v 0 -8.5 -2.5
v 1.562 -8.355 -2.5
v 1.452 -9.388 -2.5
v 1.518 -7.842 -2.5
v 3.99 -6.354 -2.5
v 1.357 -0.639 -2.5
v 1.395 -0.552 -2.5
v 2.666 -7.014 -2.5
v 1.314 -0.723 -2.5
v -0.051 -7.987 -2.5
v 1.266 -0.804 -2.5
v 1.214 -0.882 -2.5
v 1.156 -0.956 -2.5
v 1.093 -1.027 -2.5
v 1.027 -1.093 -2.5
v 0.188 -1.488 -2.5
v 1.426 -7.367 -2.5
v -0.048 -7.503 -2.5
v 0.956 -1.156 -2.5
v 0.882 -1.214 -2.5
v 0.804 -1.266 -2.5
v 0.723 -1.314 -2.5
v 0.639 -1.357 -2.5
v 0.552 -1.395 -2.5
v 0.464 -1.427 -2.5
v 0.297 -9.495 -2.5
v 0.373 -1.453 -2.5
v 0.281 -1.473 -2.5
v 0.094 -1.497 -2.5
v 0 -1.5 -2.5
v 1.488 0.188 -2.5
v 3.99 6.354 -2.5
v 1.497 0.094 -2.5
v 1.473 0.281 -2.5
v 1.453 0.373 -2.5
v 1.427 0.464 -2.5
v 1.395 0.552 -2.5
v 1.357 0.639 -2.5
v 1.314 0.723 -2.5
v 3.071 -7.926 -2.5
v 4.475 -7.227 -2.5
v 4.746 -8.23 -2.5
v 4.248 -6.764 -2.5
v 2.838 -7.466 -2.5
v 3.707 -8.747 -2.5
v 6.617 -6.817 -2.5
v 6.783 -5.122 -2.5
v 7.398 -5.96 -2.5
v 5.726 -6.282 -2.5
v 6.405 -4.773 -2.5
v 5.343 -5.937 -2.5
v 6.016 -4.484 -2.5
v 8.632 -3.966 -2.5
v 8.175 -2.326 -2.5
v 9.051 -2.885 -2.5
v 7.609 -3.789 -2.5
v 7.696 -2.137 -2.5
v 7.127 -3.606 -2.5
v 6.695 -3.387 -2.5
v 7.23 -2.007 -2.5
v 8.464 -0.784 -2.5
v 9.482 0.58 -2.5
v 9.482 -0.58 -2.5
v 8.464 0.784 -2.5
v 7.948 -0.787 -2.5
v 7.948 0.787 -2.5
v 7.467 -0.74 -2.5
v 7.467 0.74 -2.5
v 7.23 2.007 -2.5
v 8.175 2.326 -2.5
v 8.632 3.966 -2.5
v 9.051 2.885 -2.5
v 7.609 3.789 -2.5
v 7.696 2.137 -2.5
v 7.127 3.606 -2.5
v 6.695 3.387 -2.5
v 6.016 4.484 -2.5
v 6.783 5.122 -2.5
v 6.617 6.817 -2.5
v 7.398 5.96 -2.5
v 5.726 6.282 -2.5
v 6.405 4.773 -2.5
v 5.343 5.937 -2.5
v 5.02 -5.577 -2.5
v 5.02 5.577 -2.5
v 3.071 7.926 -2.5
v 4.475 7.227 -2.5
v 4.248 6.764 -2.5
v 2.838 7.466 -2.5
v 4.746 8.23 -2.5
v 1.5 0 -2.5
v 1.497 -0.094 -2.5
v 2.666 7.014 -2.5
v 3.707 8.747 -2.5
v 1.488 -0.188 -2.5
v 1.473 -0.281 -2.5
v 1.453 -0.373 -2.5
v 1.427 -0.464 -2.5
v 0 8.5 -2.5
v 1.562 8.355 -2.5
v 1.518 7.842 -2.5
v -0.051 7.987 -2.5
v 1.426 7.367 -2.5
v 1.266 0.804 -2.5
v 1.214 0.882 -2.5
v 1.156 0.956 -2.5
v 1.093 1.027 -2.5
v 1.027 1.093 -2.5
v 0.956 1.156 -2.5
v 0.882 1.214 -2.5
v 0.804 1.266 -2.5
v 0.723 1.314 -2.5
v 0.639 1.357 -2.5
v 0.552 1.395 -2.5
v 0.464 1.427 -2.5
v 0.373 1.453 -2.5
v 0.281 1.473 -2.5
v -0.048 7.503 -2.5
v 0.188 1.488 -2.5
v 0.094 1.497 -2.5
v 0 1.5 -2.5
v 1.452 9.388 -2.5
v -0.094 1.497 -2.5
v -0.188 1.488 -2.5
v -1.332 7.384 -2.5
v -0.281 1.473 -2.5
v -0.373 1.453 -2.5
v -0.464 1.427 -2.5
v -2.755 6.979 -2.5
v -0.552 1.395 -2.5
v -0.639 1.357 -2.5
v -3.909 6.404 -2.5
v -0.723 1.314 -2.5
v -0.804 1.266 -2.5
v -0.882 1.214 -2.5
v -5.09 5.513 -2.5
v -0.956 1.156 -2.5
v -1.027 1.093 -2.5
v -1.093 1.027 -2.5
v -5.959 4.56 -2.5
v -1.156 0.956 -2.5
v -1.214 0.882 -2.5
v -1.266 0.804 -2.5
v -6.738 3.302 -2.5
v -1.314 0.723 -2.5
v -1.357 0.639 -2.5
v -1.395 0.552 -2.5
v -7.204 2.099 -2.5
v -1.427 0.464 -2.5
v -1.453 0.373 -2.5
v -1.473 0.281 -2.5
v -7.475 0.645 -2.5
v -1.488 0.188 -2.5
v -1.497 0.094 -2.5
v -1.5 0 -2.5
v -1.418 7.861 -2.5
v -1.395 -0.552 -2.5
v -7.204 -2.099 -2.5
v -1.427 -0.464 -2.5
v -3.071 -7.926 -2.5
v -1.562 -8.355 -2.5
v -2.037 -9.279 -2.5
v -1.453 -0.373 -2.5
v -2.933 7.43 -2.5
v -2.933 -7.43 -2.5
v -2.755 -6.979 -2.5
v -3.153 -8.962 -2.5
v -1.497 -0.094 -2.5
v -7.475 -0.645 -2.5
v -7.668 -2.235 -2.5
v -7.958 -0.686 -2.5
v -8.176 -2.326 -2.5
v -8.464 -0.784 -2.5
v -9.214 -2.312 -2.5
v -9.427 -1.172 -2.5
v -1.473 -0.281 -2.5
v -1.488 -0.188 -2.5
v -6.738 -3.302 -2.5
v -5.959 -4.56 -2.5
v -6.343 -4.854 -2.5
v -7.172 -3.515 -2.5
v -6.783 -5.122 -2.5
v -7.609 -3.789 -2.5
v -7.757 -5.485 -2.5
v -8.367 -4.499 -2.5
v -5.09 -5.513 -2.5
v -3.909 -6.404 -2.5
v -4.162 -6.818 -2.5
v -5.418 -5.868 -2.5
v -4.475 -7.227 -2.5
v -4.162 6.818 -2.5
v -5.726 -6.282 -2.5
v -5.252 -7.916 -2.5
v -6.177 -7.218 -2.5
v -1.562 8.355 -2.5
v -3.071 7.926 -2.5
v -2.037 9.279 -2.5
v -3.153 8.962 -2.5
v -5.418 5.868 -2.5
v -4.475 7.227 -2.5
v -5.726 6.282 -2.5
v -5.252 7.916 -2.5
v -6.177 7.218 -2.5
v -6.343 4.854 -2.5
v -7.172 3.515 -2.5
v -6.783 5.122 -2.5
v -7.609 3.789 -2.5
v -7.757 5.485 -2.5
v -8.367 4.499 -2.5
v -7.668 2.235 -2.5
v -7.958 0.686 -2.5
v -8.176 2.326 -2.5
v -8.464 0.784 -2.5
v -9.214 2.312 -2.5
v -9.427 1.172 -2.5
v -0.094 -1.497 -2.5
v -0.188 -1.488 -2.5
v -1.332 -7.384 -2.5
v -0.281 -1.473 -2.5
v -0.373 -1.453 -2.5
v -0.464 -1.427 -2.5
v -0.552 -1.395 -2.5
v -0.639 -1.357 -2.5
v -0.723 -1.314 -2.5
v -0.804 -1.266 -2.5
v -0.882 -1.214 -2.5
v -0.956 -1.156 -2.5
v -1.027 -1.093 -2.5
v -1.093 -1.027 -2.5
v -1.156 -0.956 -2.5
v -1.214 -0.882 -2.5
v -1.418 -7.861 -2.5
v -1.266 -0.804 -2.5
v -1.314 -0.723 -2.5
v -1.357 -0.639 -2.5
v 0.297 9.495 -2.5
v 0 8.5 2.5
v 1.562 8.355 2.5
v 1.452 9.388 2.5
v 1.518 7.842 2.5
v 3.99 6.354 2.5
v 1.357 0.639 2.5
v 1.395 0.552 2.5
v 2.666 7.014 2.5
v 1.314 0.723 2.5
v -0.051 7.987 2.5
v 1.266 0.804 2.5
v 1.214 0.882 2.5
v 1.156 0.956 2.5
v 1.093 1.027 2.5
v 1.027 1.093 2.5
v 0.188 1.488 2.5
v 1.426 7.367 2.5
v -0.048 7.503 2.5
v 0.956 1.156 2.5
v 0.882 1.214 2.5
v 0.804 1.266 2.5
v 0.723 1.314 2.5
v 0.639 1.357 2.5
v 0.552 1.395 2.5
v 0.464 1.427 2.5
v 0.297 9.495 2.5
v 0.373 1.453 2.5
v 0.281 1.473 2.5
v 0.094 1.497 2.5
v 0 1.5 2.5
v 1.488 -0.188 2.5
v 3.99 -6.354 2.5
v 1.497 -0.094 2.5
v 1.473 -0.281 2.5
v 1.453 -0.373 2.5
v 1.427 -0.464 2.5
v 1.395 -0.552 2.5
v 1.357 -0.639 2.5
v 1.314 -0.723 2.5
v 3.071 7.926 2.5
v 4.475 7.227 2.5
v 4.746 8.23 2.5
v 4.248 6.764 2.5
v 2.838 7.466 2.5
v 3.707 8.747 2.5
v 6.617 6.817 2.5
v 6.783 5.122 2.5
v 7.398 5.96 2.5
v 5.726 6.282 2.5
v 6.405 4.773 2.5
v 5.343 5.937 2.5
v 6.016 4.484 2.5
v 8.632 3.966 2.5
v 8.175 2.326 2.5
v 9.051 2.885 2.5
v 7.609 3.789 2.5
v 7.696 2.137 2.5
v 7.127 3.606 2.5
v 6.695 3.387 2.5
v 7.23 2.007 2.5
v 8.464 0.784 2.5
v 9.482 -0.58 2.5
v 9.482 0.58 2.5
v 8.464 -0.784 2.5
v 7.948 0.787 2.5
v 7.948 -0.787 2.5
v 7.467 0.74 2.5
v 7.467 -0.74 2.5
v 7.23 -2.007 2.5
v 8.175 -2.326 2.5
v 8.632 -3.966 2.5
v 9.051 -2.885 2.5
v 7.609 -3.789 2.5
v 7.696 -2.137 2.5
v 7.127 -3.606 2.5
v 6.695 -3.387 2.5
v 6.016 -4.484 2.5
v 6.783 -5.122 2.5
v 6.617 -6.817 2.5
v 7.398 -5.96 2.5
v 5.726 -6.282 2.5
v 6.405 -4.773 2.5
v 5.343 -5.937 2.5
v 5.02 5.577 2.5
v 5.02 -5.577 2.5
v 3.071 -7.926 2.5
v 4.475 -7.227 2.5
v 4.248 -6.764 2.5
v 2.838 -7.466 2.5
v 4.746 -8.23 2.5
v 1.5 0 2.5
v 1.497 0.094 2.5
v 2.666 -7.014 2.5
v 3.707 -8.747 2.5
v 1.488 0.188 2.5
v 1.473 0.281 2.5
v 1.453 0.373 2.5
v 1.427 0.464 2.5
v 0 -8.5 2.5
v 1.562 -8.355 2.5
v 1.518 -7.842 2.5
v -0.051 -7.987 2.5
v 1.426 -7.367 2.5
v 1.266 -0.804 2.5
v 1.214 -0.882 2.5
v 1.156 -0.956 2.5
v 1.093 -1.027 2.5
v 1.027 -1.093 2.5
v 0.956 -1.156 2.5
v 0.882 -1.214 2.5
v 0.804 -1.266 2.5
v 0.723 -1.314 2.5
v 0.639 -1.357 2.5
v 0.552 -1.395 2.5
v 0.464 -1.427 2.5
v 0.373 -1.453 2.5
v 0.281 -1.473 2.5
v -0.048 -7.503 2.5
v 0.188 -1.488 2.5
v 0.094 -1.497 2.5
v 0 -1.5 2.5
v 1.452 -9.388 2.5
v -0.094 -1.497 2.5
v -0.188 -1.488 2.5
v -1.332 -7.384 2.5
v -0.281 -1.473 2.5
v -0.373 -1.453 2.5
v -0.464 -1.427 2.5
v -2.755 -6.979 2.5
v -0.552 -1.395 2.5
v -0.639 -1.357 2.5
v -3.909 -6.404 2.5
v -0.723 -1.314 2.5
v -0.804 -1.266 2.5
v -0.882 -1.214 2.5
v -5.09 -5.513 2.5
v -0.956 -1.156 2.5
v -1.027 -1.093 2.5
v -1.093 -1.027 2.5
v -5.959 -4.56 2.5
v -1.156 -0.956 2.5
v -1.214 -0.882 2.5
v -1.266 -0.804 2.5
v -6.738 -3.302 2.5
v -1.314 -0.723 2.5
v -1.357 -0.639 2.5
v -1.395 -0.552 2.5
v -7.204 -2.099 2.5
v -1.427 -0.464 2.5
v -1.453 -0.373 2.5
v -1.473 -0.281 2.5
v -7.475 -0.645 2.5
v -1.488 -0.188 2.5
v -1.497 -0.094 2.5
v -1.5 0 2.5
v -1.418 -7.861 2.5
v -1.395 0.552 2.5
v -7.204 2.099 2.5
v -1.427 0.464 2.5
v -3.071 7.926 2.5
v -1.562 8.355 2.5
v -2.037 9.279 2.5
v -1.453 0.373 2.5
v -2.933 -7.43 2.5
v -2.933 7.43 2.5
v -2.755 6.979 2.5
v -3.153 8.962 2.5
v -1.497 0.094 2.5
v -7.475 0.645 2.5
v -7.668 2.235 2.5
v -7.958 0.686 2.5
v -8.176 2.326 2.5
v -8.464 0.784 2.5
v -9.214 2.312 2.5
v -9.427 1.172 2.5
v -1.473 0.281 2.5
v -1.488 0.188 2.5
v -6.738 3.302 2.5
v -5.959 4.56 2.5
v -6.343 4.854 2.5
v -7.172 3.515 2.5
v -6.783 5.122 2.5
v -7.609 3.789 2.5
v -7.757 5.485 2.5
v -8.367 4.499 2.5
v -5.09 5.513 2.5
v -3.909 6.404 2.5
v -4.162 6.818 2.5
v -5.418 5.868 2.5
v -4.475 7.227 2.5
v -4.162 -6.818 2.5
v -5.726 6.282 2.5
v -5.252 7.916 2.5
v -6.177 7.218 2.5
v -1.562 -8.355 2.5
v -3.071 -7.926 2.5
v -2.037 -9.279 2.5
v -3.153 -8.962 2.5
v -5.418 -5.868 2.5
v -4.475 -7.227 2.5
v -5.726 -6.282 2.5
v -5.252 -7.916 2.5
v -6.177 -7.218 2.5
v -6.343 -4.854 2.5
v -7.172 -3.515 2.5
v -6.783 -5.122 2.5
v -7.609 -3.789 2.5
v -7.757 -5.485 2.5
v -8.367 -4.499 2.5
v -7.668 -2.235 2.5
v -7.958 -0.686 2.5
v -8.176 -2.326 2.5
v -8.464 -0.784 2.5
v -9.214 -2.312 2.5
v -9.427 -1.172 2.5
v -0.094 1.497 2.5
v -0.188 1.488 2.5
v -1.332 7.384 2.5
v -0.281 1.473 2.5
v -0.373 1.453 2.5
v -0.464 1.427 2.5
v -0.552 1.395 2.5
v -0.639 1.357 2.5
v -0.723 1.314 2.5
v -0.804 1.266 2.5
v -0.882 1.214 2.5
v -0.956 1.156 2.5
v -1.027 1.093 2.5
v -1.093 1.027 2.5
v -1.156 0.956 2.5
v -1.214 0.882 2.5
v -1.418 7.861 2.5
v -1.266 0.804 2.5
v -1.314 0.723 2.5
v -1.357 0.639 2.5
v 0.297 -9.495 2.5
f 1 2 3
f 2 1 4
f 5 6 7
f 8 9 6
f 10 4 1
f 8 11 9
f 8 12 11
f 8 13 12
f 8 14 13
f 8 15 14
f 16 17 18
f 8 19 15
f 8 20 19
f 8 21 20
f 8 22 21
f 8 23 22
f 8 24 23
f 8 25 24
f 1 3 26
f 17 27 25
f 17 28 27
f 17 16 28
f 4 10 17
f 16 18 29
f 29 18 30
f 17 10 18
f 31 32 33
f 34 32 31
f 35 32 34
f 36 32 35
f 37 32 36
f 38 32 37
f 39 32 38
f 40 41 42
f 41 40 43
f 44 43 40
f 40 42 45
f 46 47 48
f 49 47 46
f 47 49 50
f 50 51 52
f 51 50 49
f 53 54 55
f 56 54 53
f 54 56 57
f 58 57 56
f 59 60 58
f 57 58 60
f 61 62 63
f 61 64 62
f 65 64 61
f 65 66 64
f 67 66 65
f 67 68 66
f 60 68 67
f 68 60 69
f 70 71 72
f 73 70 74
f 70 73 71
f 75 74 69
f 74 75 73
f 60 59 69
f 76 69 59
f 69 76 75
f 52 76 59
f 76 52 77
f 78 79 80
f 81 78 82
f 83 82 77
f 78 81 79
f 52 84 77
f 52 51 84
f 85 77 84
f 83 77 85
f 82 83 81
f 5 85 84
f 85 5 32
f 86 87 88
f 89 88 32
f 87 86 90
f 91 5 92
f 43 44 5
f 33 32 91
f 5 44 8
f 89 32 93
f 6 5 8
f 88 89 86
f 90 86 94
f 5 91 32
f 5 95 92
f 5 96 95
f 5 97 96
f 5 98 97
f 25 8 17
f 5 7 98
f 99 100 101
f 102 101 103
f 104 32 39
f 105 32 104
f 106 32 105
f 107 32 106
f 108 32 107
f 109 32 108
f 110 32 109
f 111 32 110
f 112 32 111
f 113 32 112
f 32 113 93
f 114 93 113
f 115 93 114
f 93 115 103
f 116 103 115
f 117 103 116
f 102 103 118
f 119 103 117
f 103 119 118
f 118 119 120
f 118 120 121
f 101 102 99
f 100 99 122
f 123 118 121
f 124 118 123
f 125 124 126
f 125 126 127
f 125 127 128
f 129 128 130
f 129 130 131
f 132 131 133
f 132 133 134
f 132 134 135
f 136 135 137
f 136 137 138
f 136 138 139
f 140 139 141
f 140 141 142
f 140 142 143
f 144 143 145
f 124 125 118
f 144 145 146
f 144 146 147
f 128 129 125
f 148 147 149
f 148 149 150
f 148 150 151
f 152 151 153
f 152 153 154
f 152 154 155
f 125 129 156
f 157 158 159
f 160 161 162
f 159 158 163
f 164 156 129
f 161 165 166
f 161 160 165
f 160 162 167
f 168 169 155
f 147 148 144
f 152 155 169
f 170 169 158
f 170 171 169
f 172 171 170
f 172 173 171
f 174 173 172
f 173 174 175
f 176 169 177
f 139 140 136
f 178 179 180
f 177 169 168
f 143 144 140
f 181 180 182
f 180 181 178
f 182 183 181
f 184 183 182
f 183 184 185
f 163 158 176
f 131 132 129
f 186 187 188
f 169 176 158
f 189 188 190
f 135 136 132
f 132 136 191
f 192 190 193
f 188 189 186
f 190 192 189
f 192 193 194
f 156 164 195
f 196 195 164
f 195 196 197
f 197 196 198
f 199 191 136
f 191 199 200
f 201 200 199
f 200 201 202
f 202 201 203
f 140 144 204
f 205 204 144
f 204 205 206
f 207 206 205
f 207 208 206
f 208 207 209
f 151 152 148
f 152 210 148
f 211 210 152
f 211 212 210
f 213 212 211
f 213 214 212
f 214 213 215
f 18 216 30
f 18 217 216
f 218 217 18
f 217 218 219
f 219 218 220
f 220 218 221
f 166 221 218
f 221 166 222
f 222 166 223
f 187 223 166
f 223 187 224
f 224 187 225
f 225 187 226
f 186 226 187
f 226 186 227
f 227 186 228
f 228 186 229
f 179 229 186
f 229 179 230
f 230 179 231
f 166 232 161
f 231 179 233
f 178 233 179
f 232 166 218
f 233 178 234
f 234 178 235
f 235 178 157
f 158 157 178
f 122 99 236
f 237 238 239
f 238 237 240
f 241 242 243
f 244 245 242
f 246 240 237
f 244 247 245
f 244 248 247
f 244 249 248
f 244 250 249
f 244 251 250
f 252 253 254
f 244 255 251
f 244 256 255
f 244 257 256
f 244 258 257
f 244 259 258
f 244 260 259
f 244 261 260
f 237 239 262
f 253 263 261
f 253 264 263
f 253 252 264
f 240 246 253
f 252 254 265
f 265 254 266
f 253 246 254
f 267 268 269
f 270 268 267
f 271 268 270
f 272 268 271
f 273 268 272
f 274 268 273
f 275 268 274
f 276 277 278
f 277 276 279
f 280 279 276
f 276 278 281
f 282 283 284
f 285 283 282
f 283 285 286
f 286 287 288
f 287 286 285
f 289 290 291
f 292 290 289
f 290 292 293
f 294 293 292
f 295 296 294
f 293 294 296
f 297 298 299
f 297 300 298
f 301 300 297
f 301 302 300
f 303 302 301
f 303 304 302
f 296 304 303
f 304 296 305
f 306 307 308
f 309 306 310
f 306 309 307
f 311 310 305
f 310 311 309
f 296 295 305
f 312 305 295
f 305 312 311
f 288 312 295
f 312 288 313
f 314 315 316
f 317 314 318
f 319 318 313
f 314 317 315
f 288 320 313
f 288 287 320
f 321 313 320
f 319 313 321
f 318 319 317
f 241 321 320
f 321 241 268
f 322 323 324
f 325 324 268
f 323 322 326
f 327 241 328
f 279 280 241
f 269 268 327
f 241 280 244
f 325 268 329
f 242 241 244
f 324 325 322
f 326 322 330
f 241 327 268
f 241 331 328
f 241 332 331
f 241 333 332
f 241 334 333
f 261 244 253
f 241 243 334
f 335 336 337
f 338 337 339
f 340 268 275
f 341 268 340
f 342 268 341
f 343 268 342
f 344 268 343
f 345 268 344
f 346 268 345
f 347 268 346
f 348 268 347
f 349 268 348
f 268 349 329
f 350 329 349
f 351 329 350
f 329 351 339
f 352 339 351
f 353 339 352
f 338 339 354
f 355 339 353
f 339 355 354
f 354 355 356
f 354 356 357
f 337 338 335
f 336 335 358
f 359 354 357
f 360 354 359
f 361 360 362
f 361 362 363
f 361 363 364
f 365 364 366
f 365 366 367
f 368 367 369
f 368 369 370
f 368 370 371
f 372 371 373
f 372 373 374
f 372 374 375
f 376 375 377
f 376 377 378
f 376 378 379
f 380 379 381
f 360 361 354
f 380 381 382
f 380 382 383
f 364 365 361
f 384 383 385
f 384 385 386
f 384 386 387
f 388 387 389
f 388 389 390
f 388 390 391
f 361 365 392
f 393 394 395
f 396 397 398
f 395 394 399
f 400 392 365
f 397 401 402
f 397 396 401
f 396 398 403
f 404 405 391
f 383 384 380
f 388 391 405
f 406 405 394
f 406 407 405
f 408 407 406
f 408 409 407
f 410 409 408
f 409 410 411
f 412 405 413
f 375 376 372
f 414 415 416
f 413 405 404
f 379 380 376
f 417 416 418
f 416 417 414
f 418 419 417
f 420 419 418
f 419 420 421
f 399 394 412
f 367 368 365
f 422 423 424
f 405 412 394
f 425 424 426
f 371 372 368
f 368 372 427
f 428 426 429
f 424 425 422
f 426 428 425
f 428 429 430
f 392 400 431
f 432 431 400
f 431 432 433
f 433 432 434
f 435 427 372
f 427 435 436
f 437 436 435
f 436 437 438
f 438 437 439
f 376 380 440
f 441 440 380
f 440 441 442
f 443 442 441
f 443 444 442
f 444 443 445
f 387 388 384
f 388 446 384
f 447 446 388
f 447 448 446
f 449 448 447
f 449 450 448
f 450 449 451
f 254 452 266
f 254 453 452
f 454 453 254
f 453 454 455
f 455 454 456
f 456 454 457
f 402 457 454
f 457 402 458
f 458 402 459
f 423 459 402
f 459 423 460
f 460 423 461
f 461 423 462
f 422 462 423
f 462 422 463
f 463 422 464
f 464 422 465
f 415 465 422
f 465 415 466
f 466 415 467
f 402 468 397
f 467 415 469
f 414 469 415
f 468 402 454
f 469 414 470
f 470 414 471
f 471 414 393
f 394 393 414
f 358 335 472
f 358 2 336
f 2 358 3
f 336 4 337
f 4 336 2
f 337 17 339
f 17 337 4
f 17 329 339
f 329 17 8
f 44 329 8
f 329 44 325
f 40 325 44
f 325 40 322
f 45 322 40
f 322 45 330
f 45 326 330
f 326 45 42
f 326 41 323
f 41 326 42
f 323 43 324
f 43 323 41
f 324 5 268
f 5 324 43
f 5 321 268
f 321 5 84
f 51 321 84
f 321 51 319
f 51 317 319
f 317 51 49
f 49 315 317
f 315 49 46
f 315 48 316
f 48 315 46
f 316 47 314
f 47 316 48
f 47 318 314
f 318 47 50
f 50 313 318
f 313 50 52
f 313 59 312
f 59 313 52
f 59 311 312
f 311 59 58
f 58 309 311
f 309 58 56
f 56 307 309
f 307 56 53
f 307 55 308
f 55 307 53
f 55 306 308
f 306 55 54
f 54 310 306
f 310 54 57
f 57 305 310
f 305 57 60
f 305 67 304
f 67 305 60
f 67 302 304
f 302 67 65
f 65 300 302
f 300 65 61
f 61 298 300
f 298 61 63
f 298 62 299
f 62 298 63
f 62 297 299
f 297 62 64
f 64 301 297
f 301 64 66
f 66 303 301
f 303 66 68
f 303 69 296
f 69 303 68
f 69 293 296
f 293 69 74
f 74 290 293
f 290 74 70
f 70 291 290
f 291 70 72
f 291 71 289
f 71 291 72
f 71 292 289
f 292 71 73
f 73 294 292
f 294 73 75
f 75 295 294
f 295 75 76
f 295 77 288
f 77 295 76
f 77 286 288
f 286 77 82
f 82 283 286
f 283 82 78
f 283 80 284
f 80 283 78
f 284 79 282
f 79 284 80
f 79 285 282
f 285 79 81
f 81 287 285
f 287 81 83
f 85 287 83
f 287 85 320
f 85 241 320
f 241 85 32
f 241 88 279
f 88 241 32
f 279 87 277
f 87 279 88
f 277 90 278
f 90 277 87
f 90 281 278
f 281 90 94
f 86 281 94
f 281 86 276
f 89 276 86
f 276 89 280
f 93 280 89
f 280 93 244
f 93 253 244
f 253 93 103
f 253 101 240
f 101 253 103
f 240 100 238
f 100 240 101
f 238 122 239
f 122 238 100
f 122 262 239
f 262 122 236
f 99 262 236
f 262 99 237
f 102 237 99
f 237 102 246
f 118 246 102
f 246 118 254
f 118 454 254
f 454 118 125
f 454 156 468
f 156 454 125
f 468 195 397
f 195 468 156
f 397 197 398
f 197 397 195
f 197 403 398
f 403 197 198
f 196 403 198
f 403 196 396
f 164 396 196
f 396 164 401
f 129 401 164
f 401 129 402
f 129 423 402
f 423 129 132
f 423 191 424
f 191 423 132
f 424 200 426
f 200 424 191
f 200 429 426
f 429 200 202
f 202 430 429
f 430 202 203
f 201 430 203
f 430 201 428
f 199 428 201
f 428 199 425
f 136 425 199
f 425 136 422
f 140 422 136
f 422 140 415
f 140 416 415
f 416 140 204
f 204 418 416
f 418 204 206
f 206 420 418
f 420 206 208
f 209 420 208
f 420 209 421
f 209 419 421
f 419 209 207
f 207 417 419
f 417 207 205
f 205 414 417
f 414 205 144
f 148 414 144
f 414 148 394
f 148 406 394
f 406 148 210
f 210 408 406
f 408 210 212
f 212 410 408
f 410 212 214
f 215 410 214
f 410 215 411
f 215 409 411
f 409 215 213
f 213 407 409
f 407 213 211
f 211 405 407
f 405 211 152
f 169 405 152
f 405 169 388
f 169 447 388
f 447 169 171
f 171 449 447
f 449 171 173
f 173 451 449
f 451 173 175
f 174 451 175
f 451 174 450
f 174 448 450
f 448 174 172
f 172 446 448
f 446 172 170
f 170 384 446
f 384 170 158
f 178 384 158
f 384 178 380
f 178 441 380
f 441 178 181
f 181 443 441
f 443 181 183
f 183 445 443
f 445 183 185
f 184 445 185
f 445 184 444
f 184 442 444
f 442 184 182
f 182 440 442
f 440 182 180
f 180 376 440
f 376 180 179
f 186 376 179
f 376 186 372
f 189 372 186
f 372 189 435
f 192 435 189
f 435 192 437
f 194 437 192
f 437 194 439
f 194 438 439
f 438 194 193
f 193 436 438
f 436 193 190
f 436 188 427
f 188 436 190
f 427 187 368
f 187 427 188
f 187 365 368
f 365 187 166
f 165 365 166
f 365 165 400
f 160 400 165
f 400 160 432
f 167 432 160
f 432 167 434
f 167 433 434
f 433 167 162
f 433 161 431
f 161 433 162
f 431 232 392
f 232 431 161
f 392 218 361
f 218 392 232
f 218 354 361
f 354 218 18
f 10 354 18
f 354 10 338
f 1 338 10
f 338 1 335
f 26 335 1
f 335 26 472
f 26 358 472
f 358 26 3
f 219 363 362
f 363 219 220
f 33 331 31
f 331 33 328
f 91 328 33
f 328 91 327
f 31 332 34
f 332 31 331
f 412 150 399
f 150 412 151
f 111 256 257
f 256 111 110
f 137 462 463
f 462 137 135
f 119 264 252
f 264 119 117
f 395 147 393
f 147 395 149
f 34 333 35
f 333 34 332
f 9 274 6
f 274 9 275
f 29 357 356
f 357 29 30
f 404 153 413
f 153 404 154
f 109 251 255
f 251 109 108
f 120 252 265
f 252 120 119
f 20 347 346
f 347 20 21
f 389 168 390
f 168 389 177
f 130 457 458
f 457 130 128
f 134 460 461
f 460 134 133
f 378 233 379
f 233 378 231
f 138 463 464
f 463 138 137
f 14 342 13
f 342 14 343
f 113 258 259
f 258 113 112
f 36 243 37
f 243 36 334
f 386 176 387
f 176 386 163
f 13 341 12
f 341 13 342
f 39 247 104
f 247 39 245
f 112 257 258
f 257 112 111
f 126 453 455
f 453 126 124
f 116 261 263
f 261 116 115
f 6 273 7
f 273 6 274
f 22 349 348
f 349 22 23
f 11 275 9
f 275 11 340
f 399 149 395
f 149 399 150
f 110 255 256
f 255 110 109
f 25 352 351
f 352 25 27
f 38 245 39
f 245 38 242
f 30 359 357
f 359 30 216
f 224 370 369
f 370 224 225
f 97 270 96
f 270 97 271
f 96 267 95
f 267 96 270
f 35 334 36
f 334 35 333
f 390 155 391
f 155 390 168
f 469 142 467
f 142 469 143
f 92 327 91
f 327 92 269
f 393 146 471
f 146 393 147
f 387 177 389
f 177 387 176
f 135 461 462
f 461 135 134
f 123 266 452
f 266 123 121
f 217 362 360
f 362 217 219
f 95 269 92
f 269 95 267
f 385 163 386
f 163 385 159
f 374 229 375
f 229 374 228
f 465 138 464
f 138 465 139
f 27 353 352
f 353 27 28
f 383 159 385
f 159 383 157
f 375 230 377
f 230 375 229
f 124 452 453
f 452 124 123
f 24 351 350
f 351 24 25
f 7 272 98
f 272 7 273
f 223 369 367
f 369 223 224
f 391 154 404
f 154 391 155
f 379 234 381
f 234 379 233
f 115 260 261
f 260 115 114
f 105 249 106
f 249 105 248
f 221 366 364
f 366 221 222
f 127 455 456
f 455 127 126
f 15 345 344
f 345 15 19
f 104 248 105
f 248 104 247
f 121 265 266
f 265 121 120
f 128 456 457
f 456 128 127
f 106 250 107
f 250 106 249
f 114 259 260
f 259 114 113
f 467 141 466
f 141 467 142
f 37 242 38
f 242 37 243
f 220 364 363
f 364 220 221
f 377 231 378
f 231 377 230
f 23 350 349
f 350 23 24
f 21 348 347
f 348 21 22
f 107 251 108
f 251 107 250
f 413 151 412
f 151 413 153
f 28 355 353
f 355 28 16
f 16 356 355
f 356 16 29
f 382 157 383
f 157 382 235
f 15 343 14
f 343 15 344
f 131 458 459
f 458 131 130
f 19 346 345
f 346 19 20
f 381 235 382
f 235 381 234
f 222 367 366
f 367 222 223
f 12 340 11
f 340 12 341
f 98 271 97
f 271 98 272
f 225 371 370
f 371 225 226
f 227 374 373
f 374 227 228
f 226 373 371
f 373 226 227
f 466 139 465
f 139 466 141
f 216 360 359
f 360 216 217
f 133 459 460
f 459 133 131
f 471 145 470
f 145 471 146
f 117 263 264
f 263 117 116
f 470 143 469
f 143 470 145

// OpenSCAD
height = 5;
type = "Spur"; // [Spur,Cog,Double Helix(beta), Single Helix]
teeth = 17;	//	[5:56]
scale = 100;//[3:100]
hole = "Yes"; //[Yes,No]
//don't make too big or your gear will disappear
holeSize = 1.5;
if (type == "Spur")
{
if(hole == "Yes")
{
hole();
}
else
{
spur();
}
}
else if(type == "Cog")
{
if(hole == "Yes")
{
hole();
}
else
{
cog();
}
}
else if(type == "Double Helix(beta)")
{
if(hole == "Yes")
{
hole();
}
else
{
double_helix();
}
}
else if (type == "Single Helix")
{
if(hole == "Yes")
{
hole();
}
else
{
single_helix();
}
}


module gear(number_of_teeth,
		circular_pitch=false, diametral_pitch=false,
		pressure_angle=20, clearance = 0)
{

	//Convert diametrial pitch to our native circular pitch
	circular_pitch = (circular_pitch!=false?circular_pitch:180/diametral_pitch);

	// Pitch diameter: Diameter of pitch circle.
	pitch_diameter  =  number_of_teeth * circular_pitch / 180;
	pitch_radius = pitch_diameter/2;

	// Base Circle
	base_diameter = pitch_diameter*cos(pressure_angle);
	base_radius = base_diameter/2;

	// Diametrial pitch: Number of teeth per unit length.
	pitch_diametrial = number_of_teeth / pitch_diameter;

	// Addendum: Radial distance from pitch circle to outside circle.
	addendum = 1/pitch_diametrial;

	//Outer Circle
	outer_radius = pitch_radius+addendum;
	outer_diameter = outer_radius*2;

	// Dedendum: Radial distance from pitch circle to root diameter
	dedendum = addendum + clearance;

	// Root diameter: Diameter of bottom of tooth spaces.
	root_radius = pitch_radius-dedendum;
	root_diameter = root_radius * 2;

	half_thick_angle = 360 / (4 * number_of_teeth);

	union()
	{
		rotate(half_thick_angle) circle($fn=number_of_teeth*2, r=root_radius*1.001);

		for (i= [1:number_of_teeth])
		//for (i = [0])
		{
			rotate([0,0,i*360/number_of_teeth])
			{
				involute_gear_tooth(
					pitch_radius = pitch_radius,
					root_radius = root_radius,
					base_radius = base_radius,
					outer_radius = outer_radius,
					half_thick_angle = half_thick_angle);
			}
		}
	}
}


module involute_gear_tooth(
					pitch_radius,
					root_radius,
					base_radius,
					outer_radius,
					half_thick_angle
					)
{
	pitch_to_base_angle  = involute_intersect_angle( base_radius, pitch_radius );

	outer_to_base_angle = involute_intersect_angle( base_radius/2, outer_radius*1);

	base1 = 0 - pitch_to_base_angle - half_thick_angle;
	pitch1 = 0 - half_thick_angle;
	outer1 = outer_to_base_angle - pitch_to_base_angle - half_thick_angle;

	b1 = polar_to_cartesian([ base1, base_radius ]);
	p1 = polar_to_cartesian([ pitch1, pitch_radius ]);
	o1 = polar_to_cartesian([ outer1, outer_radius ]);

	b2 = polar_to_cartesian([ -base1, base_radius ]);
	p2 = polar_to_cartesian([ -pitch1, pitch_radius ]);
	o2 = polar_to_cartesian([ -outer1, outer_radius ]);

	// ( root_radius > base_radius variables )
		pitch_to_root_angle = pitch_to_base_angle - involute_intersect_angle(base_radius, root_radius );
		root1 = pitch1 - pitch_to_root_angle;
		root2 = -pitch1 + pitch_to_root_angle;
		r1_t =  polar_to_cartesian([ root1, root_radius ]);
		r2_t =  polar_to_cartesian([ -root1, root_radius ]);

	// ( else )
		r1_f =  polar_to_cartesian([ base1, root_radius ]);
		r2_f =  polar_to_cartesian([ -base1, root_radius ]);

	if (root_radius > base_radius)
	{
		//echo("true");
		polygon( points = [
			r1_t,p1,o1,o2,p2,r2_t
		], convexity = 3);
	}
	else
	{
		polygon( points = [
			r1_f, b1,p1,o1,o2,p2,b2,r2_f
		], convexity = 3);
	}

}

// Mathematical Functions
//===============

// Finds the angle of the involute about the base radius at the given distance (radius) from it's center.
//source: http://www.mathhelpforum.com/math-help/geometry/136011-circle-involute-solving-y-any-given-x.html

function involute_intersect_angle(base_radius, radius) = sqrt( pow(radius/base_radius,2) - 1);



// Polar coord [angle, radius] to cartesian coord [x,y]

function polar_to_cartesian(polar) = [
	polar[1]*cos(polar[0]),
	polar[1]*sin(polar[0])
];


// Test Cases
//===============

module test_gears()
{
	gear(number_of_teeth=51,circular_pitch=200);
	translate([0, 50])gear(number_of_teeth=17,circular_pitch=200);
	translate([-50,0]) gear(number_of_teeth=17,diametral_pitch=1);
}
module cog()
{
		gear(number_of_teeth=teeth,diametral_pitch=scale/100);

}
module single_helix()
{
	translate([50,0]);
	{
	linear_extrude(height = height, center = true, convexity = 10, twist = -45)
	 gear(number_of_teeth=teeth,diametral_pitch=scale/100);
	}
}
module double_helix()
{



linear_extrude(height = height, center = true, convexity = 10, twist = -45)
	 gear(number_of_teeth=teeth,diametral_pitch=scale/100);
	translate([0,0,height]) linear_extrude(height = height, center = true, convexity = 10, twist = 45)
	 gear(number_of_teeth=teeth,diametral_pitch=scale/100);

}
module spur()
{

		translate([0,0]) linear_extrude(height = height, center = true, convexity = 10, twist = 0)
	 gear(number_of_teeth=teeth,diametral_pitch=1);


}

module demo_3d_gears()
{
	//double helical gear
	// (helics don't line up perfectly - for display purposes only ;)
	translate([50,0])
	{
	linear_extrude(height = 10, center = true, convexity = 10, twist = -45)
	 gear(number_of_teeth=17,diametral_pitch=1);
	translate([0,0,10]) linear_extrude(height = height, center = true, convexity = 10, twist = 45)
	 gear(number_of_teeth=17,diametral_pitch=1);
	}

	//spur gear
	translate([0,-50]) linear_extrude(height = height, center = true, convexity = 10, twist = 0)
	 gear(number_of_teeth=17,diametral_pitch=1);

}
module hole() {
   difference() {
if(type == "Spur")
{
translate([0,0]) linear_extrude(height = height, center = true, convexity = 10, twist = 0)
	 gear(number_of_teeth=teeth,diametral_pitch=1);
}
else if(type == "Cog")
{
gear(number_of_teeth=teeth,diametral_pitch=scale/100);
}
else if (type == "Double Helix(beta)")
{
linear_extrude(height = height, center = true, convexity = 10, twist = -45)
	 gear(number_of_teeth=teeth,diametral_pitch=scale/100);
	translate([0,0,height]) linear_extrude(height = height, center = true, convexity = 10, twist = 45)
	 gear(number_of_teeth=teeth,diametral_pitch=scale/100);
}
else if (type == "Single Helix")
{
linear_extrude(height = height, center = true, convexity = 10, twist = -45)
	 gear(number_of_teeth=teeth,diametral_pitch=scale/100);
}
# rotate ([0,0,0]) cylinder (h = height*4, r=holeSize, center = true, $fn=100);
}
}




module test_involute_curve()
{
	for (i=[0,1,2,3,4,5,6,7,8,9,10,11,12,13,14,15])
	{
		translate(polar_to_cartesian([involute_intersect_angle( 0.1,i) , i ])) circle($fn=15, r=0.5);
	}
}
